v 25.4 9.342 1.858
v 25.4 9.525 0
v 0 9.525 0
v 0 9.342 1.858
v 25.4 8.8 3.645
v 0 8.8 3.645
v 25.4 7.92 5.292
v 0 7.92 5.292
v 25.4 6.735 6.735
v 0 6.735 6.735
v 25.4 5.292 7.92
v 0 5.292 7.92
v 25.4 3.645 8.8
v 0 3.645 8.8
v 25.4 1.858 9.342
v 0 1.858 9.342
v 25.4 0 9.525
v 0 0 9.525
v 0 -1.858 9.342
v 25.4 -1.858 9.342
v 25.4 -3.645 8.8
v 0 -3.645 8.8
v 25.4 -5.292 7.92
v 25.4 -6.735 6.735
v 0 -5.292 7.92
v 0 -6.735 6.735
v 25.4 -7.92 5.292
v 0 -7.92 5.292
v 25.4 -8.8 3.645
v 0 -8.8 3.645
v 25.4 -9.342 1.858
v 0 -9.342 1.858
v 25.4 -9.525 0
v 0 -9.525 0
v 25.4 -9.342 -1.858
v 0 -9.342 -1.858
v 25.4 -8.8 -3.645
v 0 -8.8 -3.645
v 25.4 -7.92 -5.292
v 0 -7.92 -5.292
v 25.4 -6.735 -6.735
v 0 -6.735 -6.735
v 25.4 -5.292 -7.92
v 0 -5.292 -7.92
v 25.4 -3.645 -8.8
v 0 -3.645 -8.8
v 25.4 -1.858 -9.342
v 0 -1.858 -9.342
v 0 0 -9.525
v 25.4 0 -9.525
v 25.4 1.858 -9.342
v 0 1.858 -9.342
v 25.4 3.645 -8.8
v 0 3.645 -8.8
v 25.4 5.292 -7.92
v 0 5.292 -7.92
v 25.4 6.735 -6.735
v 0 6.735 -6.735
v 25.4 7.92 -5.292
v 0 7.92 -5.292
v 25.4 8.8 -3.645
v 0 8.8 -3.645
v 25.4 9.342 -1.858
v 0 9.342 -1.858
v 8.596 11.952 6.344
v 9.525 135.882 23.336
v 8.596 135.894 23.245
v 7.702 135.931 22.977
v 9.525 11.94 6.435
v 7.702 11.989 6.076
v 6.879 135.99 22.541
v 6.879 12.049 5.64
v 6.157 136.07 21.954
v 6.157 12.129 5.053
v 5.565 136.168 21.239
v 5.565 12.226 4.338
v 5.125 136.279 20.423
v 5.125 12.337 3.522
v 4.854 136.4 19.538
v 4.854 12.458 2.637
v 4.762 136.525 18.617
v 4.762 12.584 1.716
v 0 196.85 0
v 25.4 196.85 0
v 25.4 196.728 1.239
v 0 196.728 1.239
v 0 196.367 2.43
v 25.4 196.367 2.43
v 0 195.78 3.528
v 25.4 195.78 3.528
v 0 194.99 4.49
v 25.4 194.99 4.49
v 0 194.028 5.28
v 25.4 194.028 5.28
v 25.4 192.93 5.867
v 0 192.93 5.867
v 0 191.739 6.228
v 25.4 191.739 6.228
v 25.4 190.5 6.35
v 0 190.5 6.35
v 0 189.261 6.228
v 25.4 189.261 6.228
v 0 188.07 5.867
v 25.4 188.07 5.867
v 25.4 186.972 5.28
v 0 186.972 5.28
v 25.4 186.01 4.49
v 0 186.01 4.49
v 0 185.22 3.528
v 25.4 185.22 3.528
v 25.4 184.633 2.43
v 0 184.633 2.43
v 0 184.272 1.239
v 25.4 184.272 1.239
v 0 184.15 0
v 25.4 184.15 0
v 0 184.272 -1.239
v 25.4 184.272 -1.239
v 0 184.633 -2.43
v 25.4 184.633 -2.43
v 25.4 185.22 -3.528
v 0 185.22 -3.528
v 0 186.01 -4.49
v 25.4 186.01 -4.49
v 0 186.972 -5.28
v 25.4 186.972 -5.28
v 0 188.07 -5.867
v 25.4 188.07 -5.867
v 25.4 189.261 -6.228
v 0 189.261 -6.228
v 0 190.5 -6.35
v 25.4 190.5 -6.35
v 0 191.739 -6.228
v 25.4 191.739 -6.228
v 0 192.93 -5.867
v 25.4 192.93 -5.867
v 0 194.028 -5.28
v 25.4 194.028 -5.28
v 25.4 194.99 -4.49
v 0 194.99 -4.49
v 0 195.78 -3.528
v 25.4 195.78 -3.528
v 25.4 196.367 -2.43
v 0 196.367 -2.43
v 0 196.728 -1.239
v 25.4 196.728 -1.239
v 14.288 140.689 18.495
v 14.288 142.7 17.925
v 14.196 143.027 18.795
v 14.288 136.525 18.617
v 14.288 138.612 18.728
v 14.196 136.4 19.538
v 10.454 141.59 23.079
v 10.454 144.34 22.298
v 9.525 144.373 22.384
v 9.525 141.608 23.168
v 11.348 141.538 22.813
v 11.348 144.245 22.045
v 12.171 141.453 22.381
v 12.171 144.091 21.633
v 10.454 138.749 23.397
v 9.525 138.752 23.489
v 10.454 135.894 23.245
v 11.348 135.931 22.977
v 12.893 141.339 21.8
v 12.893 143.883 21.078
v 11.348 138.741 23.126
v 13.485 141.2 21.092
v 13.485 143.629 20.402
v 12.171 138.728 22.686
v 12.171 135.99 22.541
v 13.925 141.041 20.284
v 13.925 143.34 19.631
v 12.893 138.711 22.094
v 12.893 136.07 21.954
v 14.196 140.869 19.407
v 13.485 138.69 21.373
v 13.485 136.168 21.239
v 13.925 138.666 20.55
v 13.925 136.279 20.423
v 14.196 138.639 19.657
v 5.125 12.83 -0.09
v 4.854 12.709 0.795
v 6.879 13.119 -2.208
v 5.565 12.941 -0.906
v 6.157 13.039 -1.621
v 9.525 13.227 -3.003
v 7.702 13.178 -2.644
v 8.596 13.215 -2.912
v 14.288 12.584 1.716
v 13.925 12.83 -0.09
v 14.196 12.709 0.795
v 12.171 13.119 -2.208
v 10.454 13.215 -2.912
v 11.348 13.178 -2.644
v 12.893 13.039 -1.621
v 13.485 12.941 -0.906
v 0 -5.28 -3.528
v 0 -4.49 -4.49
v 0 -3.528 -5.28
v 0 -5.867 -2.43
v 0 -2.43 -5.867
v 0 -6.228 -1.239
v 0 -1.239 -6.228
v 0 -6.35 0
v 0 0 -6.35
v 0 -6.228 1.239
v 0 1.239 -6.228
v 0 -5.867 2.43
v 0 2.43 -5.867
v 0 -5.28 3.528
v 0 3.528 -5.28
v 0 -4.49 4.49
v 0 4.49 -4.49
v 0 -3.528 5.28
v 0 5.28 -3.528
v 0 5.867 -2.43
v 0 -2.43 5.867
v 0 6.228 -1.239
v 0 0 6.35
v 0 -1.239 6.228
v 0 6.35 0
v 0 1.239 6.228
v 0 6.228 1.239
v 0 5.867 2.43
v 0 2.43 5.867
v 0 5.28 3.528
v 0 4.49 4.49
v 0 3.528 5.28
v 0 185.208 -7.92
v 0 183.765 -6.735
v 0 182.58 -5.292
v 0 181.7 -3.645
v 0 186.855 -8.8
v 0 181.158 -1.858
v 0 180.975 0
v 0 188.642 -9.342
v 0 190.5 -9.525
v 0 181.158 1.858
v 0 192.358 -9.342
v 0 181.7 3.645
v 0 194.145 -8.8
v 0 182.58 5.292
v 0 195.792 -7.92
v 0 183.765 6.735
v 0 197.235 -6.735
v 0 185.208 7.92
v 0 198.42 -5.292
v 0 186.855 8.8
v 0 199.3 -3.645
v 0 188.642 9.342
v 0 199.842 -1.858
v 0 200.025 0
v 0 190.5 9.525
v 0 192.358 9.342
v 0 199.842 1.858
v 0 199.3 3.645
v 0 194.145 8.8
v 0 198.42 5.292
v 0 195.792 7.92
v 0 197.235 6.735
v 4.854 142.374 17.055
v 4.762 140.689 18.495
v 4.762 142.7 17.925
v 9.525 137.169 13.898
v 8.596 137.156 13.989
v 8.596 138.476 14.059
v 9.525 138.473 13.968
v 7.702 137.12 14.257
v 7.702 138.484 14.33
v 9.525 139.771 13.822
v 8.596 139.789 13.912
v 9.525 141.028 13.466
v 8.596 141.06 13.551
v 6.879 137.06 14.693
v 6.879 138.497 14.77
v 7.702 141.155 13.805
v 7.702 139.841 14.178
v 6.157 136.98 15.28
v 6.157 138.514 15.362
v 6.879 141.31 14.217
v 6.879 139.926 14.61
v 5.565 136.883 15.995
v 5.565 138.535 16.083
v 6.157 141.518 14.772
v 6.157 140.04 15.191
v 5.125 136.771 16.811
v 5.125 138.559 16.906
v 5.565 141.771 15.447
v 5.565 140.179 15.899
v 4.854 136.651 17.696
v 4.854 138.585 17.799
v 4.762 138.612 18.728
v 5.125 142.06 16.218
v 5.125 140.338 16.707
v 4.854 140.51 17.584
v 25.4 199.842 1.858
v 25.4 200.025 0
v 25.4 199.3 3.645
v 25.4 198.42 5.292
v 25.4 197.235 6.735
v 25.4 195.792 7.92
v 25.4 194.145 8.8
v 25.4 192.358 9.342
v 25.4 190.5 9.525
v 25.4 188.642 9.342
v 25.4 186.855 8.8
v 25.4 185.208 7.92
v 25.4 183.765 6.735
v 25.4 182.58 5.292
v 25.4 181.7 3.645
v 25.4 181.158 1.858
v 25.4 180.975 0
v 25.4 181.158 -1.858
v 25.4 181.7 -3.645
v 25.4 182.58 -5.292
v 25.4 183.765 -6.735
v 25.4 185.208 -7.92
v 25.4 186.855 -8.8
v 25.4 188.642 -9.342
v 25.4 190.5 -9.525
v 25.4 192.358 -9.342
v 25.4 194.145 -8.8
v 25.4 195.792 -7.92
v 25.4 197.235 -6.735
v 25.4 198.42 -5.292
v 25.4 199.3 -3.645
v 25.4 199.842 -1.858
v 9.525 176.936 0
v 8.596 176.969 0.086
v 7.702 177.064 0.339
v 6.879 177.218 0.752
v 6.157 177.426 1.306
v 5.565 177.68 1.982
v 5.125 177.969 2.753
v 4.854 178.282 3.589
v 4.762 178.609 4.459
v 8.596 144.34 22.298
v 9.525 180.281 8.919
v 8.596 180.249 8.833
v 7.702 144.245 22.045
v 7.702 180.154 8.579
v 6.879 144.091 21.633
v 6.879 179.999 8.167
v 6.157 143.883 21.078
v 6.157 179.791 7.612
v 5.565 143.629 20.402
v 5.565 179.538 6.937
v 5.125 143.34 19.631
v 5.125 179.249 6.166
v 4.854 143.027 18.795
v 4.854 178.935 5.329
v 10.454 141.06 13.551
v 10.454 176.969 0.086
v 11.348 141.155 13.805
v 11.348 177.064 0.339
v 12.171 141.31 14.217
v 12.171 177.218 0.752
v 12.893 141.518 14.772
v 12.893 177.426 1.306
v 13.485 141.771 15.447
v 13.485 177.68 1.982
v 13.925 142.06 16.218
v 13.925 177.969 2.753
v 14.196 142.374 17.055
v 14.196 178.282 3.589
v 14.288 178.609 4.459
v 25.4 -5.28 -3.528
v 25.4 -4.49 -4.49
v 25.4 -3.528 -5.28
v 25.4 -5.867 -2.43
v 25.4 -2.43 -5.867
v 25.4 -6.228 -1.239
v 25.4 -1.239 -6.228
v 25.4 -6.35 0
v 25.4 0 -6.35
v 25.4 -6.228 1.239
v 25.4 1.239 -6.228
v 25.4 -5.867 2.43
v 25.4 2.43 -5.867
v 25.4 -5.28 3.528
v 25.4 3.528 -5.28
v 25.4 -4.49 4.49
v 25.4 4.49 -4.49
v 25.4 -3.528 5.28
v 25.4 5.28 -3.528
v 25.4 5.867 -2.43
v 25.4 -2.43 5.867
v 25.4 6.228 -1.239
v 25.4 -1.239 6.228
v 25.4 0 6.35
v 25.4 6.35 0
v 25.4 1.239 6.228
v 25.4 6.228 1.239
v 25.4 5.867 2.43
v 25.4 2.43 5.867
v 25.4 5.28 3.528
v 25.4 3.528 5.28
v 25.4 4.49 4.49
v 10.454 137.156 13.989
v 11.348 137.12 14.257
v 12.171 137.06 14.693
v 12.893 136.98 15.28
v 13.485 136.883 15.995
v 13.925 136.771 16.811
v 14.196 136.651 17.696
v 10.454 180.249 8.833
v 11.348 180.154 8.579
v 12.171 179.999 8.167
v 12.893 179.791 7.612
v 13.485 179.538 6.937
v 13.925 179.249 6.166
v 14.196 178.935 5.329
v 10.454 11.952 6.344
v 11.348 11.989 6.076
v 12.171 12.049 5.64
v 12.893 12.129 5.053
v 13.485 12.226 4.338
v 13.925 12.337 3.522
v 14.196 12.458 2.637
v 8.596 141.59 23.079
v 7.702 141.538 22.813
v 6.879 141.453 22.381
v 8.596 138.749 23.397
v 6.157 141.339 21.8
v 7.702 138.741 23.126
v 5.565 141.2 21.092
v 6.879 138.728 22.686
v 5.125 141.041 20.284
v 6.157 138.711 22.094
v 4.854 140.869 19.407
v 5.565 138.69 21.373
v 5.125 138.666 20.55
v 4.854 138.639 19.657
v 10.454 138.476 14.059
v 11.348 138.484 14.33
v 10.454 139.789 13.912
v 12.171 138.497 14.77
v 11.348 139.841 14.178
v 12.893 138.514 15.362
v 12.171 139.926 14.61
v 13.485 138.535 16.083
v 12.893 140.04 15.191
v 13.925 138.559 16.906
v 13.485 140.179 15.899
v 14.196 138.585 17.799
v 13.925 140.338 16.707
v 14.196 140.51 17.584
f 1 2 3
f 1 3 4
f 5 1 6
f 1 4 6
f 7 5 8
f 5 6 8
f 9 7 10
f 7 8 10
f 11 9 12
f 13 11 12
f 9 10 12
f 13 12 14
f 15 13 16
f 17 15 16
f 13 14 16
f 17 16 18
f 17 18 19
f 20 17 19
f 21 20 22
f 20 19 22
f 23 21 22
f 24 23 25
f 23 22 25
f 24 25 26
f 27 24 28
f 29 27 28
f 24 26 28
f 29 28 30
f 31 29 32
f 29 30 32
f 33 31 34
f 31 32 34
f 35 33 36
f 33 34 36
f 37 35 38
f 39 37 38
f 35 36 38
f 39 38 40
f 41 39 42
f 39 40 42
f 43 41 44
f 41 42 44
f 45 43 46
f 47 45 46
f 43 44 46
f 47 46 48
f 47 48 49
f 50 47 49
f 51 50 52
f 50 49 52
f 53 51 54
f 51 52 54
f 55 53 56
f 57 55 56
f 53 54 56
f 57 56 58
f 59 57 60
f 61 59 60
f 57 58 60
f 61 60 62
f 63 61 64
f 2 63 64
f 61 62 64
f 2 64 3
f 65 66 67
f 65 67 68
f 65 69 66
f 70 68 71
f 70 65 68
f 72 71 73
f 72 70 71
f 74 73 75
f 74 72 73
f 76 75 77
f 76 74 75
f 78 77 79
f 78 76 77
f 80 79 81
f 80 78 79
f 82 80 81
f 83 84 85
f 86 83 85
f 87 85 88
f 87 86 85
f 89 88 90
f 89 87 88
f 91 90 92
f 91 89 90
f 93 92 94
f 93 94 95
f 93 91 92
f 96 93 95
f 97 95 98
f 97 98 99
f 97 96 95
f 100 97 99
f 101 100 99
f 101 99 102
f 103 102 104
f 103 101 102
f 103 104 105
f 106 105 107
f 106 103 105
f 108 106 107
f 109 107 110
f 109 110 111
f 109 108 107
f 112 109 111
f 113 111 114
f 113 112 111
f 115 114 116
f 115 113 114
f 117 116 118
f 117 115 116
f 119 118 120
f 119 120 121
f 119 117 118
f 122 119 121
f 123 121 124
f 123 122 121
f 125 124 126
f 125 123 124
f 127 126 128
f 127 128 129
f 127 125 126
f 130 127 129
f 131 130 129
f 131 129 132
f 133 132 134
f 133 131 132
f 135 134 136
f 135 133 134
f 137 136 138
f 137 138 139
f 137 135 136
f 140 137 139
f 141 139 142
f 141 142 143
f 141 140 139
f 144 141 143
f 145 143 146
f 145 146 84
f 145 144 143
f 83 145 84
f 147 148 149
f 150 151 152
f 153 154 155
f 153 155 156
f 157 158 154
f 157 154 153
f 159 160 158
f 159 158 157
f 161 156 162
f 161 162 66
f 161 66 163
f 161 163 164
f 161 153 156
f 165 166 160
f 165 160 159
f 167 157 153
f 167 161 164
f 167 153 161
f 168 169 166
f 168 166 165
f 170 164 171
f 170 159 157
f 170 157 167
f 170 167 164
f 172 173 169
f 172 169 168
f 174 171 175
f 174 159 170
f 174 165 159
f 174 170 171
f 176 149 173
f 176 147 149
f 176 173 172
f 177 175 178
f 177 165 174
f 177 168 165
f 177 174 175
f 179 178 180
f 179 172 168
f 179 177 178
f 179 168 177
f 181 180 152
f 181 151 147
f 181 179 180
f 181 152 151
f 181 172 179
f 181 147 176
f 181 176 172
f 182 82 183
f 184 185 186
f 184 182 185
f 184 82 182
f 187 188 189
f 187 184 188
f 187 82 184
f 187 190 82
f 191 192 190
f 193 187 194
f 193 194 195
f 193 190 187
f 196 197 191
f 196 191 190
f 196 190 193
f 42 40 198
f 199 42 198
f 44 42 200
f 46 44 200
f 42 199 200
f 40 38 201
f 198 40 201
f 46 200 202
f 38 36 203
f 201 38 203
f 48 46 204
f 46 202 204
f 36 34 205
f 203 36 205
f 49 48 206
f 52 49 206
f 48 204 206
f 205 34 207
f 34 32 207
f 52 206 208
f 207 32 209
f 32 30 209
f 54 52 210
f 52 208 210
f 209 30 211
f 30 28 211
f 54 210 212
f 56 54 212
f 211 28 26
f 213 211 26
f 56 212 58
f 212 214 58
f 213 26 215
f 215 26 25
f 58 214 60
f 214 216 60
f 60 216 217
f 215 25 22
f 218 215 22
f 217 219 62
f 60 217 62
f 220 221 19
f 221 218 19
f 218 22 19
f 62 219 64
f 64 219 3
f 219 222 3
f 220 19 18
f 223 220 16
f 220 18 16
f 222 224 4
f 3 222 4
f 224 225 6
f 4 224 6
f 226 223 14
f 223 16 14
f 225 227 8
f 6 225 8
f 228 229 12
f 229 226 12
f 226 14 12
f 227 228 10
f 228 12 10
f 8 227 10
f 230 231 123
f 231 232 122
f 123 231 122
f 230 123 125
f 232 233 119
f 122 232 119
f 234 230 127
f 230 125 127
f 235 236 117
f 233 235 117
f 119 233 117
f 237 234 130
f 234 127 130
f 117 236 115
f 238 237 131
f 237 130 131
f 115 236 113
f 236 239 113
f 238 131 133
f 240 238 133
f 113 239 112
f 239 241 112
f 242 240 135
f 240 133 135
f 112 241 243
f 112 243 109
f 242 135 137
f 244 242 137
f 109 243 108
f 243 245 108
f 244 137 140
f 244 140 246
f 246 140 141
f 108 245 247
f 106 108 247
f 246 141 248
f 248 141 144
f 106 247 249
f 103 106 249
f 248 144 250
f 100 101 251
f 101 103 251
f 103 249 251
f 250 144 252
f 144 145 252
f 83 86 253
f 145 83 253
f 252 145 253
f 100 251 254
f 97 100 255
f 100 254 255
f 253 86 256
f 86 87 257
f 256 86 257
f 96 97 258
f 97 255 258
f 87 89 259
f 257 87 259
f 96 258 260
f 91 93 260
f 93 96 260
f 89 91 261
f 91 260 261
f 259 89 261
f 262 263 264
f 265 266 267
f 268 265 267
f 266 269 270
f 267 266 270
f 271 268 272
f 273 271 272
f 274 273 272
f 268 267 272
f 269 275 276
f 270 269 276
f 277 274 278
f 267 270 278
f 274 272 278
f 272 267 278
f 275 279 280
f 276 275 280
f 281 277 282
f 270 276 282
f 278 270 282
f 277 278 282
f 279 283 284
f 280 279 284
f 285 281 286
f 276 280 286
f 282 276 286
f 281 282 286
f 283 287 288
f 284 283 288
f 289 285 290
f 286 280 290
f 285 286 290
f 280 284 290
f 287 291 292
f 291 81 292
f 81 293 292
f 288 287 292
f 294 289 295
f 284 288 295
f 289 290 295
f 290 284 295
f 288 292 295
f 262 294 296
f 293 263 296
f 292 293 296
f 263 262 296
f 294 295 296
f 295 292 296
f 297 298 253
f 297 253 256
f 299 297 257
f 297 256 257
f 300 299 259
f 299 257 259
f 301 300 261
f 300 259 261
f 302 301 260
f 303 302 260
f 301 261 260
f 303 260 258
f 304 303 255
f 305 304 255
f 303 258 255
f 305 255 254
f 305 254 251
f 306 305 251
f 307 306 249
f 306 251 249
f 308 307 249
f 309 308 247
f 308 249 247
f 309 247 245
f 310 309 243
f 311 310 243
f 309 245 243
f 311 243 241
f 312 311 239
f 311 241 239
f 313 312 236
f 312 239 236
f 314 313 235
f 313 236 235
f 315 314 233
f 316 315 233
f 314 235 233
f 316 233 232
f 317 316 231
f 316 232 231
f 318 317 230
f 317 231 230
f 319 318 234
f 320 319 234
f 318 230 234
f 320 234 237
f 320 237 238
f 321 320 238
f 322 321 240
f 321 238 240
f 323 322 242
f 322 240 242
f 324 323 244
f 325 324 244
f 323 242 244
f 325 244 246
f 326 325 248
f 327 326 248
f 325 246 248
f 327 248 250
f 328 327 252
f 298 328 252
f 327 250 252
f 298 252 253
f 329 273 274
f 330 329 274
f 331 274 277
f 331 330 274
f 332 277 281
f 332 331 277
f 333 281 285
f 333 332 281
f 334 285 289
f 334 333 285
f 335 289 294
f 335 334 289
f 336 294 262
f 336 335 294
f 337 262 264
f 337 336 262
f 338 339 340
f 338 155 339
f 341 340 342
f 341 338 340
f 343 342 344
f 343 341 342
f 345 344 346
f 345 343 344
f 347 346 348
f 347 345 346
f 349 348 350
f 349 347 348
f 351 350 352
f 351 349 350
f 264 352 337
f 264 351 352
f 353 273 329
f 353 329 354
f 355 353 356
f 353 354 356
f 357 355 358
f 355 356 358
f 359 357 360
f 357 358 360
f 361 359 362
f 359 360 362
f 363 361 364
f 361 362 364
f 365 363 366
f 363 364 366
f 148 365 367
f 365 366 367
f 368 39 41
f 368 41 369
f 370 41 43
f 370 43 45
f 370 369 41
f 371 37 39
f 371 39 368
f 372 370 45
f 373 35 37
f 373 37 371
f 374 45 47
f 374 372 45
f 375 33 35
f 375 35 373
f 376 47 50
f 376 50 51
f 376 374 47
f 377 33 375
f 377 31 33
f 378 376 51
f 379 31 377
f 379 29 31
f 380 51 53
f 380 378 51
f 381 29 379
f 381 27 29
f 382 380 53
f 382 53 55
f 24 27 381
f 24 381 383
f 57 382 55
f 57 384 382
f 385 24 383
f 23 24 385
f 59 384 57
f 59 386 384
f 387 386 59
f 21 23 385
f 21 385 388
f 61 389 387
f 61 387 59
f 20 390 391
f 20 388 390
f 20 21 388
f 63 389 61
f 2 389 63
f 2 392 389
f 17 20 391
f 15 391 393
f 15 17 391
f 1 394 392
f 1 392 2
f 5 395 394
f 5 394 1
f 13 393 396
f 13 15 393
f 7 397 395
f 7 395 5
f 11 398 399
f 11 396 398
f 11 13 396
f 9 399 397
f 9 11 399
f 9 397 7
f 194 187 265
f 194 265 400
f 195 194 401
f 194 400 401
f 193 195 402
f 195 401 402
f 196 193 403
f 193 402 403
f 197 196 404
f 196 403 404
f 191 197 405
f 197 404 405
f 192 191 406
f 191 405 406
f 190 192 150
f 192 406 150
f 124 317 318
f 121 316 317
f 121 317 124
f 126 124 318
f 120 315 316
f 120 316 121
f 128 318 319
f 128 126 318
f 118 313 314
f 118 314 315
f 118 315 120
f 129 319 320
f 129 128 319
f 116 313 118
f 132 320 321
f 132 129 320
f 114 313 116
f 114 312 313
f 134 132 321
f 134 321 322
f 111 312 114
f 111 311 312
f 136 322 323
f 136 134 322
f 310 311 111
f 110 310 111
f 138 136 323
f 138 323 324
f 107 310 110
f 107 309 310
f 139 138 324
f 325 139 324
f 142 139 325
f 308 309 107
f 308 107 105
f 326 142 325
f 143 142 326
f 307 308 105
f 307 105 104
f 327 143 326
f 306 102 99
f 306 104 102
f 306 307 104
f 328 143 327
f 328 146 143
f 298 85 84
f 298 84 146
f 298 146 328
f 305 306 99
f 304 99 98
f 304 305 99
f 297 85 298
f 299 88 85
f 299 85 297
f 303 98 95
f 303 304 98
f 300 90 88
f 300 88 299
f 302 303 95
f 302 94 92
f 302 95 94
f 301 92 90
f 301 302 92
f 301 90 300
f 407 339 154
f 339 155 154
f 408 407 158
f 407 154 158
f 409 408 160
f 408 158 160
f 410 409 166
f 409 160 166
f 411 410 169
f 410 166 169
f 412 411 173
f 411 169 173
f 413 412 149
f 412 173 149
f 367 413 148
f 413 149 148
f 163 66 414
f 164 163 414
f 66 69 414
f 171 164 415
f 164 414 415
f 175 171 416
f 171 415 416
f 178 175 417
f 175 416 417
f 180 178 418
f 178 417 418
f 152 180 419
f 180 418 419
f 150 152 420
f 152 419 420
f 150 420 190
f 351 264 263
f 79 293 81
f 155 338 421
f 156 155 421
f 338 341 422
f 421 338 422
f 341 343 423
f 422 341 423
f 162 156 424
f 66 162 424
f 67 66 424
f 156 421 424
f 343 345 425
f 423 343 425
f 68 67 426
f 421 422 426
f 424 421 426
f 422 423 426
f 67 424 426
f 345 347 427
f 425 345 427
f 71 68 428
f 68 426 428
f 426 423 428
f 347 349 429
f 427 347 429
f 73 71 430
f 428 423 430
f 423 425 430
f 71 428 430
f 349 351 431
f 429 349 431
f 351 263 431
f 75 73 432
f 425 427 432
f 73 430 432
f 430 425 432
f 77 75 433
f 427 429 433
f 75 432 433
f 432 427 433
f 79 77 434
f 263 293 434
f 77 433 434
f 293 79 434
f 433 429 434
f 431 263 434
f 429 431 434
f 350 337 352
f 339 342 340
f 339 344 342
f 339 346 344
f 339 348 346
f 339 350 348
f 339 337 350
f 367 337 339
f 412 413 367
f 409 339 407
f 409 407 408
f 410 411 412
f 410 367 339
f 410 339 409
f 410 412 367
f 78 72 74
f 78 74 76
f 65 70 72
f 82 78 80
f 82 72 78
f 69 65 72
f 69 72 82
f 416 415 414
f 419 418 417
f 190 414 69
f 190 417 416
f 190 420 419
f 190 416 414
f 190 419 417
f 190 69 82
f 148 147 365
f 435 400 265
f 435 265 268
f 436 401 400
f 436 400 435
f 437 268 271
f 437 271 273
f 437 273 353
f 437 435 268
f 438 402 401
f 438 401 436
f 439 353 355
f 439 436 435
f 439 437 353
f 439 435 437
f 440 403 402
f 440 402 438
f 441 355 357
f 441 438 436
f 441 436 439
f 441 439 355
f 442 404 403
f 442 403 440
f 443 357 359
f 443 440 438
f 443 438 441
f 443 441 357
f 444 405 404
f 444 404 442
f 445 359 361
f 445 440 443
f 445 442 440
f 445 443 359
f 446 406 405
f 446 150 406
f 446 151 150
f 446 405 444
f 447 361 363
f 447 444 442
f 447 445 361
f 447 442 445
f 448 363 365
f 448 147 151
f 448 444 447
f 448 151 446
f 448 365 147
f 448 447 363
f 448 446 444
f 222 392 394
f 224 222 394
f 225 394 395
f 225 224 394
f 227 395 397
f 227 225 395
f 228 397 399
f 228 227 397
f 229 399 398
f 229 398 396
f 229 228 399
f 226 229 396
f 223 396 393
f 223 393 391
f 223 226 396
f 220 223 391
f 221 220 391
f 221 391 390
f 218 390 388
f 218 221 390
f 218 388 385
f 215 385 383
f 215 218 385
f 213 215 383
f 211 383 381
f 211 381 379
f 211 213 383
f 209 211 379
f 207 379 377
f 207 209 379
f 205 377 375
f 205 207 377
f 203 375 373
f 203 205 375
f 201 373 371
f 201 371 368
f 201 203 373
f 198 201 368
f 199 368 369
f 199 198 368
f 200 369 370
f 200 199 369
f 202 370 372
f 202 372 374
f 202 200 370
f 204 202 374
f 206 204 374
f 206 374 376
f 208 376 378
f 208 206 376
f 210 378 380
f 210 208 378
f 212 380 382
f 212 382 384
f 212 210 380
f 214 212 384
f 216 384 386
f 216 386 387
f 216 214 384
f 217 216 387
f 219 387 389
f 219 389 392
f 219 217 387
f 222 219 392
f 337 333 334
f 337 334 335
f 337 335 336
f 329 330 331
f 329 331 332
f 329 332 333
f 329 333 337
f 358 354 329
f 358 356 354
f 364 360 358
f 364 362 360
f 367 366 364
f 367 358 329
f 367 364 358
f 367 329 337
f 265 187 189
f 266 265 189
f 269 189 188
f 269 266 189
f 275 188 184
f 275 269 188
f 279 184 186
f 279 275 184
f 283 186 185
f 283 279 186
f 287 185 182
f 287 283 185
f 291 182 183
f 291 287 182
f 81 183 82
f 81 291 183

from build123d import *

# Parameters (mm, degrees)
F0_R     = 9.525
F0_R_2   = 6.35
F1_DEPTH = 25.4
F4_DEPTH = 4.7625
F5_R     = 4.76249


# Not quite as in the source:
# - a fillet or chamfer is up to 0.001 mm smaller than in the source, because OpenCascade refuses the exact size


with BuildPart() as f1:
    # F0 (on Right) → F1 (new body)
    with BuildSketch(Plane.YZ):
        Circle(F0_R)
        Circle(F0_R_2, mode=Mode.SUBTRACT)
    extrude(amount=F1_DEPTH)


with BuildPart() as f1b:
    # F0 (on Right) → F1, piece 2 (new body)
    with BuildSketch(Plane.YZ):
        with Locations((190.5, 0)):
            Circle(F0_R)
        with Locations((190.5, 0)):
            Circle(F0_R_2, mode=Mode.SUBTRACT)
    extrude(amount=F1_DEPTH)


with BuildPart() as f4:
    # F3 (on offset) → F4 (new body, symmetric)
    with BuildSketch(Plane.YZ.offset(9.525)):
        with BuildLine():
            Line((11.9400664966, 6.4347663754), (12.5835431405, 1.7159376536))
            Line((12.5835431405, 1.7159376536), (13.2270197717, -3.0028909752))
            Line((13.2270197717, -3.0028909752), (137.1685550482, 13.8982274716))
            ThreePointArc((137.1685550482, 13.8982274716), (139.1251729174, 13.9216162696), (141.0280584284, 13.4656258597))
            Line((141.0280584284, 13.4656258597), (176.9363940543, 0))
            Line((176.9363940543, 0), (178.6086190953, 4.4592667759))
            Line((178.6086190953, 4.4592667759), (180.2808448354, 8.9185354163))
            Line((180.2808448354, 8.9185354163), (144.3725092096, 22.3841612761))
            ThreePointArc((144.3725092096, 22.3841612761), (140.1861610854, 23.3873401779), (135.8816017732, 23.3358848222))
            Line((135.8816017732, 23.3358848222), (11.9400664966, 6.4347663754))
        make_face()
    extrude(amount=F4_DEPTH, both=True)

    # F5 (radius 4.7625 in the source; OpenCascade refuses exactly that, so slightly less here)
    f5_edges = [f4.edges().sort_by_distance(p)[0] for p in [
        (14.2875, 75.197787, 5.447668),
        (14.2875, 73.910834, 14.885326),
        (4.7625, 73.910834, 14.885326),
        (4.7625, 75.197787, 5.447668),
    ]]
    fillet(f5_edges, radius=F5_R)


solid = Compound([f1.part, f1b.part, f4.part])
